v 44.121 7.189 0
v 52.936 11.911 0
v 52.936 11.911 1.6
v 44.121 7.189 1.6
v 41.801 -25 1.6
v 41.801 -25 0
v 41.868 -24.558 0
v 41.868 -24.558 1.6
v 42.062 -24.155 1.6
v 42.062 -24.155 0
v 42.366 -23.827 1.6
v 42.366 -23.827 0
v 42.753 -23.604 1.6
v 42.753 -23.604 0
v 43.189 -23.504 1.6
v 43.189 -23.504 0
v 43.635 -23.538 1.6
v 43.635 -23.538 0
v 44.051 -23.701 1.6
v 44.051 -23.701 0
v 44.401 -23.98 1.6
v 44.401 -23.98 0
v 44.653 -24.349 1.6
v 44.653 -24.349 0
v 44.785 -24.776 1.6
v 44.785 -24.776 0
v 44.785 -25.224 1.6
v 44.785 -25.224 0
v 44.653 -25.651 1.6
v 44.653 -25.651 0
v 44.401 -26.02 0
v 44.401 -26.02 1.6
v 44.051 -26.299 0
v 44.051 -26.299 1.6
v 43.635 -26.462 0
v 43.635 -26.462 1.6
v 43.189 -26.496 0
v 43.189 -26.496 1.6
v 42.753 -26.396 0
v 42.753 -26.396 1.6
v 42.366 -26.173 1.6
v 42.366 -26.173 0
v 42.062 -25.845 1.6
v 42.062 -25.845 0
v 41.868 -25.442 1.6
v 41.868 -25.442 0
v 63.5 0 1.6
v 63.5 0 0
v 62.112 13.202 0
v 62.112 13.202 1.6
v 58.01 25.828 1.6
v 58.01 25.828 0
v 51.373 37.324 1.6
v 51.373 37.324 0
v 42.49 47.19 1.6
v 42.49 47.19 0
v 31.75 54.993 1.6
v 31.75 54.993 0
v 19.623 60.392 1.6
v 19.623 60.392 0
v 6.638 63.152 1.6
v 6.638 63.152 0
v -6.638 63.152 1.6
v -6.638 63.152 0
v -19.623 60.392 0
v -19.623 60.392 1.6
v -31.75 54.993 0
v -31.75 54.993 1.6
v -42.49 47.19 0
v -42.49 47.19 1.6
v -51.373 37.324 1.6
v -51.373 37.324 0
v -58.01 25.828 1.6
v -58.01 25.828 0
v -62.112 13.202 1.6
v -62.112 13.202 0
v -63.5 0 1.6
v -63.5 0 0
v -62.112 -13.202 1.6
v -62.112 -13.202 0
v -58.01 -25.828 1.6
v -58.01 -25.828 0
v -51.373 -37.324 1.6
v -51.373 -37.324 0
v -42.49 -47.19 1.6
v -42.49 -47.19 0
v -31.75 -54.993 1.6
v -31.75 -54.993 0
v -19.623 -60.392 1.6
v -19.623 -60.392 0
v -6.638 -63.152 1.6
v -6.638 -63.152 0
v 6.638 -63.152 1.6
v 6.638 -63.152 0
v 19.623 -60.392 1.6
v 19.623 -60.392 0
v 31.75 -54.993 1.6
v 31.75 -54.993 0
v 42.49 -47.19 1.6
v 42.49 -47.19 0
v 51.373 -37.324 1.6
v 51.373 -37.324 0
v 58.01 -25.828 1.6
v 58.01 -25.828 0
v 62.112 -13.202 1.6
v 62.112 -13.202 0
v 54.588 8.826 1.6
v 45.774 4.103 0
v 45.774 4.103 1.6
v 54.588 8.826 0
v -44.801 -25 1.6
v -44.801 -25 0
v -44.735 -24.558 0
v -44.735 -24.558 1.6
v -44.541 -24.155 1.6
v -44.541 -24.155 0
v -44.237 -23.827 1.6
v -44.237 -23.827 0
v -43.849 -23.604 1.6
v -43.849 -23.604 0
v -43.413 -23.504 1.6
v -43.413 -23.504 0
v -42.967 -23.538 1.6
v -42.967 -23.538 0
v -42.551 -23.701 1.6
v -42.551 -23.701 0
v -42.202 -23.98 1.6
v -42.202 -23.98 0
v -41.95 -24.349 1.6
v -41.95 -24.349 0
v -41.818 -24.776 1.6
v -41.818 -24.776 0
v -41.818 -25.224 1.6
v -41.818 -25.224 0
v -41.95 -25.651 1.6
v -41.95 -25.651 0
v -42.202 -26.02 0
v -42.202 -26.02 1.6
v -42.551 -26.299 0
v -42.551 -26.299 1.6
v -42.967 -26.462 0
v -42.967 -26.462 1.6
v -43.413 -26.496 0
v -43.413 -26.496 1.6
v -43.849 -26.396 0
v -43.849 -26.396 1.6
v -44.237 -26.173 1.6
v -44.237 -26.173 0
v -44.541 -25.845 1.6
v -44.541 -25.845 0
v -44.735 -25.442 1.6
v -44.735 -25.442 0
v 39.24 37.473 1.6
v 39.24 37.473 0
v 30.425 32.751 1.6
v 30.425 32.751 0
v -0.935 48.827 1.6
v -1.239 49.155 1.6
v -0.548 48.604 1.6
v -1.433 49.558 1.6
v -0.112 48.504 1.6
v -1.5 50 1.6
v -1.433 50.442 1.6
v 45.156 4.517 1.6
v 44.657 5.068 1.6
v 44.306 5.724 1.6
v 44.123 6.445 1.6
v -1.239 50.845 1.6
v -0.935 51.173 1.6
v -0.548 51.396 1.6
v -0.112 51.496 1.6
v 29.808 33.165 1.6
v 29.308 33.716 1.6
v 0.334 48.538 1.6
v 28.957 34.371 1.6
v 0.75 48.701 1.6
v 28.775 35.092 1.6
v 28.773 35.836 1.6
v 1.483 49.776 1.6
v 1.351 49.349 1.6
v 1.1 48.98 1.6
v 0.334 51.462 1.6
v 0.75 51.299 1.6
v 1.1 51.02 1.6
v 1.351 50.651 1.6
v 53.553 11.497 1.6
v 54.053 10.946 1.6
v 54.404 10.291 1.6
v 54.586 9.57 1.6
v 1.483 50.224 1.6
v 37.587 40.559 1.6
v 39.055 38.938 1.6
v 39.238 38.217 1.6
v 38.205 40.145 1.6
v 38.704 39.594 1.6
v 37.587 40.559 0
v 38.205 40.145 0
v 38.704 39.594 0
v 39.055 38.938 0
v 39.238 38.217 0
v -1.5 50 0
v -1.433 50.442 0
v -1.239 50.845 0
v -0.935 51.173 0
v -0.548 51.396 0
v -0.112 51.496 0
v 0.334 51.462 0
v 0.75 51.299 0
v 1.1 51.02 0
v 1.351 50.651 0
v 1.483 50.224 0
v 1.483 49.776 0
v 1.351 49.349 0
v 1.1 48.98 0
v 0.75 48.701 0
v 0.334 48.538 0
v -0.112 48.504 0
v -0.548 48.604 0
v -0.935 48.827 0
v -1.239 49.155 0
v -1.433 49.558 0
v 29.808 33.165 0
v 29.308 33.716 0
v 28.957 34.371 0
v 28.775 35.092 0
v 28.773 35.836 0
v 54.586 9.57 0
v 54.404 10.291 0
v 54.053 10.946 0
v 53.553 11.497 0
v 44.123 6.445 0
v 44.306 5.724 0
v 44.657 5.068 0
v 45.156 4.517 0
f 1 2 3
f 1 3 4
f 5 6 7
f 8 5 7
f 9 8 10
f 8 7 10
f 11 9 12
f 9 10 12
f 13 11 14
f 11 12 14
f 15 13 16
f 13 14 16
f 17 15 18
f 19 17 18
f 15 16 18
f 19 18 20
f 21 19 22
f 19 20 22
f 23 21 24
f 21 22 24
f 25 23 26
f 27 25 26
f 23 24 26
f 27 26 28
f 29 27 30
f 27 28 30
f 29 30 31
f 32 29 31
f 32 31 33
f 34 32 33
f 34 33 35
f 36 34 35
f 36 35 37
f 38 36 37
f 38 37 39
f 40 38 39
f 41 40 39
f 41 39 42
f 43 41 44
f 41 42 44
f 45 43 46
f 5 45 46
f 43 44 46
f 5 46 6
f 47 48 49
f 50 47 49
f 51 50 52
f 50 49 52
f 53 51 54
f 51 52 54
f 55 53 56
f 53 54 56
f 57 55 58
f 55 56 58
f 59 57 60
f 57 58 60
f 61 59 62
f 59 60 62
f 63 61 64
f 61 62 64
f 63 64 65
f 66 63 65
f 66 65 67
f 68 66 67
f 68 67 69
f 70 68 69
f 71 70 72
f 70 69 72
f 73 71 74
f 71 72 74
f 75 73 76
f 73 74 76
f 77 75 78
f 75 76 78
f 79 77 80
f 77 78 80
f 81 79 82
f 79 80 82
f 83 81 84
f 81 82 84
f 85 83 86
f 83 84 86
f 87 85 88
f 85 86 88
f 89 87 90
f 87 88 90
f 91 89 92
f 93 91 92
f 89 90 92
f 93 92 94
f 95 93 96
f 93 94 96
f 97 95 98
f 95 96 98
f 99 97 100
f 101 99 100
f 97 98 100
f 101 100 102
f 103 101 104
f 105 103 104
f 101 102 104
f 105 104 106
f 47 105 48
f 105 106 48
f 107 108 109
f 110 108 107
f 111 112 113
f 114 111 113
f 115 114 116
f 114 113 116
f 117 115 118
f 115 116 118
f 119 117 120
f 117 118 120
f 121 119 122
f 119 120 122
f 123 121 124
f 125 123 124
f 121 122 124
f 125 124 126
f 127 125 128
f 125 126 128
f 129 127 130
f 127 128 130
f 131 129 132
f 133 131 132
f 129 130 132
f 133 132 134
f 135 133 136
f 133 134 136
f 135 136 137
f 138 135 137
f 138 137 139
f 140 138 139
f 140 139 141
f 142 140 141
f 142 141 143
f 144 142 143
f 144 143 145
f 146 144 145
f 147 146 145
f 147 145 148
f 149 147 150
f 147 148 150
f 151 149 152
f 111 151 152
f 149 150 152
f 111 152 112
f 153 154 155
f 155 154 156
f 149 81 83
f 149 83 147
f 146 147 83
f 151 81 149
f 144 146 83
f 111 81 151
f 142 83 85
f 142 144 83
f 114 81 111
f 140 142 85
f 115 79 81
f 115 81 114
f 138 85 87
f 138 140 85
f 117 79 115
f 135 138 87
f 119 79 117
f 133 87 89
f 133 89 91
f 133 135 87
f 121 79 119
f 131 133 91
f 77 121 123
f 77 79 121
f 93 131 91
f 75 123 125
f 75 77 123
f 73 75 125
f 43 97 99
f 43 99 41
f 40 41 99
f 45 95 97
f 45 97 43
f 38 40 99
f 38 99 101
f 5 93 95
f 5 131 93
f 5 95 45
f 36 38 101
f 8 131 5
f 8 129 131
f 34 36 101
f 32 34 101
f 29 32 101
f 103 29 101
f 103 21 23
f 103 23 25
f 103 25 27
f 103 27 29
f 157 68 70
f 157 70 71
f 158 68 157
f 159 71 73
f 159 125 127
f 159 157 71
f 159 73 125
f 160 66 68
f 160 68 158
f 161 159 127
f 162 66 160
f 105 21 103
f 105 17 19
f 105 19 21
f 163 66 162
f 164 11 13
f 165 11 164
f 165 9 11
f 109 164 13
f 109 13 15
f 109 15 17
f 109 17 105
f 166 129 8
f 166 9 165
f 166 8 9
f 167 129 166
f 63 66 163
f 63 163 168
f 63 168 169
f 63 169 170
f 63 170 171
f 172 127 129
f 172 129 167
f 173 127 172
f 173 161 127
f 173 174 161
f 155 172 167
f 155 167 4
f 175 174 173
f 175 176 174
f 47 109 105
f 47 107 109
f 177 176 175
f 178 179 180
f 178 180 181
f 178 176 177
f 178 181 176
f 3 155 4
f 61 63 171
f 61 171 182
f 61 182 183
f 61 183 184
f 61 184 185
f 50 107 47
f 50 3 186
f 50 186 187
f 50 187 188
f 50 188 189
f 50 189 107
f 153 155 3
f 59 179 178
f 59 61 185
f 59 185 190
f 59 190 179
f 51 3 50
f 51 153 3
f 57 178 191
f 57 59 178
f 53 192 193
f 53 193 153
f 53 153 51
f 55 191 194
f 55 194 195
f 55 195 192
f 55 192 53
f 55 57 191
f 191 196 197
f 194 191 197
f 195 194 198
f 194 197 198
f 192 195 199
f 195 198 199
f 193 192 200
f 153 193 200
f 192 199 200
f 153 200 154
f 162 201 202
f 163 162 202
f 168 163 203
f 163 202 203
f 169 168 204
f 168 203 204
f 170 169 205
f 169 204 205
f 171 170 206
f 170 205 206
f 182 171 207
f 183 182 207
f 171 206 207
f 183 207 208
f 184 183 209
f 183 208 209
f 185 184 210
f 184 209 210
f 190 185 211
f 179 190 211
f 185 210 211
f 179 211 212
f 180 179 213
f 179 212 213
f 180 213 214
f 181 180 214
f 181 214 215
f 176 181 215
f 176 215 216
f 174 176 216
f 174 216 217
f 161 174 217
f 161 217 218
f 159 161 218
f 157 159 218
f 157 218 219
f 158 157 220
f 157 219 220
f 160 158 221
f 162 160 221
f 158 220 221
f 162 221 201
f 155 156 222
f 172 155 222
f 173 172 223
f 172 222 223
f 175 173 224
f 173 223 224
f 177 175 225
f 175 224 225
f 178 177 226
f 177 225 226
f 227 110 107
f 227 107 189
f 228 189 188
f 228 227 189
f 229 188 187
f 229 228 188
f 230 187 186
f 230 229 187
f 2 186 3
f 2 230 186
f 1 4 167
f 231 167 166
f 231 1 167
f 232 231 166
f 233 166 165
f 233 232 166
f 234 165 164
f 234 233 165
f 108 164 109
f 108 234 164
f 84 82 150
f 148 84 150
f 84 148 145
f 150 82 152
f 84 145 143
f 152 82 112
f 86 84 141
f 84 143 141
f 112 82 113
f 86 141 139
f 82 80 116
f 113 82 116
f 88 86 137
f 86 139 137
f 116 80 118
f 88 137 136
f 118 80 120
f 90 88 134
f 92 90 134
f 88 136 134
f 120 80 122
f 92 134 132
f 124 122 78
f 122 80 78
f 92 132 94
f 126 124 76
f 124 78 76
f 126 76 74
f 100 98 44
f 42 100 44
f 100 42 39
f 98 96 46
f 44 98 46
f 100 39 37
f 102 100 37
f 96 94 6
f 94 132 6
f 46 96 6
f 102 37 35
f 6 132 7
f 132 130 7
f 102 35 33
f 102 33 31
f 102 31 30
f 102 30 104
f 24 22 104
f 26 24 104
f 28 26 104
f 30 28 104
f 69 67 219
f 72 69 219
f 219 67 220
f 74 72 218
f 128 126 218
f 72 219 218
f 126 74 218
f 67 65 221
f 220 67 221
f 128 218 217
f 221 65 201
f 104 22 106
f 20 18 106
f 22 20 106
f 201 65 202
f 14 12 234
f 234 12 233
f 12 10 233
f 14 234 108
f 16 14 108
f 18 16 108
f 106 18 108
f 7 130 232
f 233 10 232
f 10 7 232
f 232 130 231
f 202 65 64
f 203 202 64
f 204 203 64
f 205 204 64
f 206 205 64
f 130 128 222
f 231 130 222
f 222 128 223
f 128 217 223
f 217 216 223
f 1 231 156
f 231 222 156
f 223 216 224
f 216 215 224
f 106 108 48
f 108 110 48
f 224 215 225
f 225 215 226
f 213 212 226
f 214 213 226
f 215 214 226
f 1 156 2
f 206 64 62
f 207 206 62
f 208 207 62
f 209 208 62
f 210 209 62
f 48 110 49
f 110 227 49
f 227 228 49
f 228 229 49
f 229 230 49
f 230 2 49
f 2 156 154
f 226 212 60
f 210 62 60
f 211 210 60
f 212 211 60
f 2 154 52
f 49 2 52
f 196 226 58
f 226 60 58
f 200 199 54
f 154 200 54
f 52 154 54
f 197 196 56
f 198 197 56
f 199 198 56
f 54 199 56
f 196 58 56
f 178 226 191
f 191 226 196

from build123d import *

# Parameters (mm, degrees)
SKETCH1_R           = 63.5
BOSS_EXTRUDE1_DEPTH = 1.6
SKETCH3_R           = 1.75
CUT_EXTRUDE4_DEPTH  = 1.6
SKETCH2_R           = 1.5
CUT_EXTRUDE5_DEPTH  = 1.6
CUT_EXTRUDE6_DEPTH  = 10


with BuildPart() as part:
    # Sketch1 → Boss-Extrude1 (new body)
    with BuildSketch(Plane.XY):
        Circle(SKETCH1_R)
    extrude(amount=BOSS_EXTRUDE1_DEPTH)

    # Sketch3 → Cut-Extrude4 (cut)
    with BuildSketch(Plane(origin=(0, 0, 0), x_dir=(-1, 0, 0), z_dir=(0, 0, -1))):
        with Locations((-34.006305458, 36.654756705)):
            Circle(SKETCH3_R)
        with Locations((-49.354669589, 8.007283544)):
            Circle(SKETCH3_R)
    extrude(amount=-CUT_EXTRUDE4_DEPTH, mode=Mode.SUBTRACT)

    # Sketch2 → Cut-Extrude5 (cut)
    with BuildSketch(Plane(origin=(0, 0, 0), x_dir=(-1, 0, 0), z_dir=(0, 0, -1))):
        with Locations((0, 50)):
            Circle(SKETCH2_R)
        with Locations((43.301270189, -25)):
            Circle(SKETCH2_R)
        with Locations((-43.301270189, -25)):
            Circle(SKETCH2_R)
    extrude(amount=-CUT_EXTRUDE5_DEPTH, mode=Mode.SUBTRACT)

    # Sketch4 → Cut-Extrude6 (cut)
    with BuildSketch(Plane(origin=(0, 0, 0), x_dir=(-1, 0, 0), z_dir=(0, 0, -1))):
        with BuildLine():
            Line((-52.935522776, 11.911126581), (-44.12091565, 7.188553002))
            ThreePointArc((-44.12091565, 7.188553002), (-44.461118004, 5.385481223), (-45.773816402, 4.103440508))
            Line((-45.773816402, 4.103440508), (-54.588423529, 8.826014086))
            ThreePointArc((-54.588423529, 8.826014086), (-54.248221174, 10.629085865), (-52.935522776, 11.911126581))
        make_face()
        with BuildLine():
            Line((-39.240059397, 37.473487247), (-30.425452271, 32.750913668))
            ThreePointArc((-30.425452271, 32.750913668), (-29.112753873, 34.032954384), (-28.772551518, 35.836026163))
            Line((-28.772551518, 35.836026163), (-37.587158645, 40.558599742))
            ThreePointArc((-37.587158645, 40.558599742), (-38.899857043, 39.276559026), (-39.240059397, 37.473487247))
        make_face()
    extrude(amount=-CUT_EXTRUDE6_DEPTH, mode=Mode.SUBTRACT)


solid = part.part
